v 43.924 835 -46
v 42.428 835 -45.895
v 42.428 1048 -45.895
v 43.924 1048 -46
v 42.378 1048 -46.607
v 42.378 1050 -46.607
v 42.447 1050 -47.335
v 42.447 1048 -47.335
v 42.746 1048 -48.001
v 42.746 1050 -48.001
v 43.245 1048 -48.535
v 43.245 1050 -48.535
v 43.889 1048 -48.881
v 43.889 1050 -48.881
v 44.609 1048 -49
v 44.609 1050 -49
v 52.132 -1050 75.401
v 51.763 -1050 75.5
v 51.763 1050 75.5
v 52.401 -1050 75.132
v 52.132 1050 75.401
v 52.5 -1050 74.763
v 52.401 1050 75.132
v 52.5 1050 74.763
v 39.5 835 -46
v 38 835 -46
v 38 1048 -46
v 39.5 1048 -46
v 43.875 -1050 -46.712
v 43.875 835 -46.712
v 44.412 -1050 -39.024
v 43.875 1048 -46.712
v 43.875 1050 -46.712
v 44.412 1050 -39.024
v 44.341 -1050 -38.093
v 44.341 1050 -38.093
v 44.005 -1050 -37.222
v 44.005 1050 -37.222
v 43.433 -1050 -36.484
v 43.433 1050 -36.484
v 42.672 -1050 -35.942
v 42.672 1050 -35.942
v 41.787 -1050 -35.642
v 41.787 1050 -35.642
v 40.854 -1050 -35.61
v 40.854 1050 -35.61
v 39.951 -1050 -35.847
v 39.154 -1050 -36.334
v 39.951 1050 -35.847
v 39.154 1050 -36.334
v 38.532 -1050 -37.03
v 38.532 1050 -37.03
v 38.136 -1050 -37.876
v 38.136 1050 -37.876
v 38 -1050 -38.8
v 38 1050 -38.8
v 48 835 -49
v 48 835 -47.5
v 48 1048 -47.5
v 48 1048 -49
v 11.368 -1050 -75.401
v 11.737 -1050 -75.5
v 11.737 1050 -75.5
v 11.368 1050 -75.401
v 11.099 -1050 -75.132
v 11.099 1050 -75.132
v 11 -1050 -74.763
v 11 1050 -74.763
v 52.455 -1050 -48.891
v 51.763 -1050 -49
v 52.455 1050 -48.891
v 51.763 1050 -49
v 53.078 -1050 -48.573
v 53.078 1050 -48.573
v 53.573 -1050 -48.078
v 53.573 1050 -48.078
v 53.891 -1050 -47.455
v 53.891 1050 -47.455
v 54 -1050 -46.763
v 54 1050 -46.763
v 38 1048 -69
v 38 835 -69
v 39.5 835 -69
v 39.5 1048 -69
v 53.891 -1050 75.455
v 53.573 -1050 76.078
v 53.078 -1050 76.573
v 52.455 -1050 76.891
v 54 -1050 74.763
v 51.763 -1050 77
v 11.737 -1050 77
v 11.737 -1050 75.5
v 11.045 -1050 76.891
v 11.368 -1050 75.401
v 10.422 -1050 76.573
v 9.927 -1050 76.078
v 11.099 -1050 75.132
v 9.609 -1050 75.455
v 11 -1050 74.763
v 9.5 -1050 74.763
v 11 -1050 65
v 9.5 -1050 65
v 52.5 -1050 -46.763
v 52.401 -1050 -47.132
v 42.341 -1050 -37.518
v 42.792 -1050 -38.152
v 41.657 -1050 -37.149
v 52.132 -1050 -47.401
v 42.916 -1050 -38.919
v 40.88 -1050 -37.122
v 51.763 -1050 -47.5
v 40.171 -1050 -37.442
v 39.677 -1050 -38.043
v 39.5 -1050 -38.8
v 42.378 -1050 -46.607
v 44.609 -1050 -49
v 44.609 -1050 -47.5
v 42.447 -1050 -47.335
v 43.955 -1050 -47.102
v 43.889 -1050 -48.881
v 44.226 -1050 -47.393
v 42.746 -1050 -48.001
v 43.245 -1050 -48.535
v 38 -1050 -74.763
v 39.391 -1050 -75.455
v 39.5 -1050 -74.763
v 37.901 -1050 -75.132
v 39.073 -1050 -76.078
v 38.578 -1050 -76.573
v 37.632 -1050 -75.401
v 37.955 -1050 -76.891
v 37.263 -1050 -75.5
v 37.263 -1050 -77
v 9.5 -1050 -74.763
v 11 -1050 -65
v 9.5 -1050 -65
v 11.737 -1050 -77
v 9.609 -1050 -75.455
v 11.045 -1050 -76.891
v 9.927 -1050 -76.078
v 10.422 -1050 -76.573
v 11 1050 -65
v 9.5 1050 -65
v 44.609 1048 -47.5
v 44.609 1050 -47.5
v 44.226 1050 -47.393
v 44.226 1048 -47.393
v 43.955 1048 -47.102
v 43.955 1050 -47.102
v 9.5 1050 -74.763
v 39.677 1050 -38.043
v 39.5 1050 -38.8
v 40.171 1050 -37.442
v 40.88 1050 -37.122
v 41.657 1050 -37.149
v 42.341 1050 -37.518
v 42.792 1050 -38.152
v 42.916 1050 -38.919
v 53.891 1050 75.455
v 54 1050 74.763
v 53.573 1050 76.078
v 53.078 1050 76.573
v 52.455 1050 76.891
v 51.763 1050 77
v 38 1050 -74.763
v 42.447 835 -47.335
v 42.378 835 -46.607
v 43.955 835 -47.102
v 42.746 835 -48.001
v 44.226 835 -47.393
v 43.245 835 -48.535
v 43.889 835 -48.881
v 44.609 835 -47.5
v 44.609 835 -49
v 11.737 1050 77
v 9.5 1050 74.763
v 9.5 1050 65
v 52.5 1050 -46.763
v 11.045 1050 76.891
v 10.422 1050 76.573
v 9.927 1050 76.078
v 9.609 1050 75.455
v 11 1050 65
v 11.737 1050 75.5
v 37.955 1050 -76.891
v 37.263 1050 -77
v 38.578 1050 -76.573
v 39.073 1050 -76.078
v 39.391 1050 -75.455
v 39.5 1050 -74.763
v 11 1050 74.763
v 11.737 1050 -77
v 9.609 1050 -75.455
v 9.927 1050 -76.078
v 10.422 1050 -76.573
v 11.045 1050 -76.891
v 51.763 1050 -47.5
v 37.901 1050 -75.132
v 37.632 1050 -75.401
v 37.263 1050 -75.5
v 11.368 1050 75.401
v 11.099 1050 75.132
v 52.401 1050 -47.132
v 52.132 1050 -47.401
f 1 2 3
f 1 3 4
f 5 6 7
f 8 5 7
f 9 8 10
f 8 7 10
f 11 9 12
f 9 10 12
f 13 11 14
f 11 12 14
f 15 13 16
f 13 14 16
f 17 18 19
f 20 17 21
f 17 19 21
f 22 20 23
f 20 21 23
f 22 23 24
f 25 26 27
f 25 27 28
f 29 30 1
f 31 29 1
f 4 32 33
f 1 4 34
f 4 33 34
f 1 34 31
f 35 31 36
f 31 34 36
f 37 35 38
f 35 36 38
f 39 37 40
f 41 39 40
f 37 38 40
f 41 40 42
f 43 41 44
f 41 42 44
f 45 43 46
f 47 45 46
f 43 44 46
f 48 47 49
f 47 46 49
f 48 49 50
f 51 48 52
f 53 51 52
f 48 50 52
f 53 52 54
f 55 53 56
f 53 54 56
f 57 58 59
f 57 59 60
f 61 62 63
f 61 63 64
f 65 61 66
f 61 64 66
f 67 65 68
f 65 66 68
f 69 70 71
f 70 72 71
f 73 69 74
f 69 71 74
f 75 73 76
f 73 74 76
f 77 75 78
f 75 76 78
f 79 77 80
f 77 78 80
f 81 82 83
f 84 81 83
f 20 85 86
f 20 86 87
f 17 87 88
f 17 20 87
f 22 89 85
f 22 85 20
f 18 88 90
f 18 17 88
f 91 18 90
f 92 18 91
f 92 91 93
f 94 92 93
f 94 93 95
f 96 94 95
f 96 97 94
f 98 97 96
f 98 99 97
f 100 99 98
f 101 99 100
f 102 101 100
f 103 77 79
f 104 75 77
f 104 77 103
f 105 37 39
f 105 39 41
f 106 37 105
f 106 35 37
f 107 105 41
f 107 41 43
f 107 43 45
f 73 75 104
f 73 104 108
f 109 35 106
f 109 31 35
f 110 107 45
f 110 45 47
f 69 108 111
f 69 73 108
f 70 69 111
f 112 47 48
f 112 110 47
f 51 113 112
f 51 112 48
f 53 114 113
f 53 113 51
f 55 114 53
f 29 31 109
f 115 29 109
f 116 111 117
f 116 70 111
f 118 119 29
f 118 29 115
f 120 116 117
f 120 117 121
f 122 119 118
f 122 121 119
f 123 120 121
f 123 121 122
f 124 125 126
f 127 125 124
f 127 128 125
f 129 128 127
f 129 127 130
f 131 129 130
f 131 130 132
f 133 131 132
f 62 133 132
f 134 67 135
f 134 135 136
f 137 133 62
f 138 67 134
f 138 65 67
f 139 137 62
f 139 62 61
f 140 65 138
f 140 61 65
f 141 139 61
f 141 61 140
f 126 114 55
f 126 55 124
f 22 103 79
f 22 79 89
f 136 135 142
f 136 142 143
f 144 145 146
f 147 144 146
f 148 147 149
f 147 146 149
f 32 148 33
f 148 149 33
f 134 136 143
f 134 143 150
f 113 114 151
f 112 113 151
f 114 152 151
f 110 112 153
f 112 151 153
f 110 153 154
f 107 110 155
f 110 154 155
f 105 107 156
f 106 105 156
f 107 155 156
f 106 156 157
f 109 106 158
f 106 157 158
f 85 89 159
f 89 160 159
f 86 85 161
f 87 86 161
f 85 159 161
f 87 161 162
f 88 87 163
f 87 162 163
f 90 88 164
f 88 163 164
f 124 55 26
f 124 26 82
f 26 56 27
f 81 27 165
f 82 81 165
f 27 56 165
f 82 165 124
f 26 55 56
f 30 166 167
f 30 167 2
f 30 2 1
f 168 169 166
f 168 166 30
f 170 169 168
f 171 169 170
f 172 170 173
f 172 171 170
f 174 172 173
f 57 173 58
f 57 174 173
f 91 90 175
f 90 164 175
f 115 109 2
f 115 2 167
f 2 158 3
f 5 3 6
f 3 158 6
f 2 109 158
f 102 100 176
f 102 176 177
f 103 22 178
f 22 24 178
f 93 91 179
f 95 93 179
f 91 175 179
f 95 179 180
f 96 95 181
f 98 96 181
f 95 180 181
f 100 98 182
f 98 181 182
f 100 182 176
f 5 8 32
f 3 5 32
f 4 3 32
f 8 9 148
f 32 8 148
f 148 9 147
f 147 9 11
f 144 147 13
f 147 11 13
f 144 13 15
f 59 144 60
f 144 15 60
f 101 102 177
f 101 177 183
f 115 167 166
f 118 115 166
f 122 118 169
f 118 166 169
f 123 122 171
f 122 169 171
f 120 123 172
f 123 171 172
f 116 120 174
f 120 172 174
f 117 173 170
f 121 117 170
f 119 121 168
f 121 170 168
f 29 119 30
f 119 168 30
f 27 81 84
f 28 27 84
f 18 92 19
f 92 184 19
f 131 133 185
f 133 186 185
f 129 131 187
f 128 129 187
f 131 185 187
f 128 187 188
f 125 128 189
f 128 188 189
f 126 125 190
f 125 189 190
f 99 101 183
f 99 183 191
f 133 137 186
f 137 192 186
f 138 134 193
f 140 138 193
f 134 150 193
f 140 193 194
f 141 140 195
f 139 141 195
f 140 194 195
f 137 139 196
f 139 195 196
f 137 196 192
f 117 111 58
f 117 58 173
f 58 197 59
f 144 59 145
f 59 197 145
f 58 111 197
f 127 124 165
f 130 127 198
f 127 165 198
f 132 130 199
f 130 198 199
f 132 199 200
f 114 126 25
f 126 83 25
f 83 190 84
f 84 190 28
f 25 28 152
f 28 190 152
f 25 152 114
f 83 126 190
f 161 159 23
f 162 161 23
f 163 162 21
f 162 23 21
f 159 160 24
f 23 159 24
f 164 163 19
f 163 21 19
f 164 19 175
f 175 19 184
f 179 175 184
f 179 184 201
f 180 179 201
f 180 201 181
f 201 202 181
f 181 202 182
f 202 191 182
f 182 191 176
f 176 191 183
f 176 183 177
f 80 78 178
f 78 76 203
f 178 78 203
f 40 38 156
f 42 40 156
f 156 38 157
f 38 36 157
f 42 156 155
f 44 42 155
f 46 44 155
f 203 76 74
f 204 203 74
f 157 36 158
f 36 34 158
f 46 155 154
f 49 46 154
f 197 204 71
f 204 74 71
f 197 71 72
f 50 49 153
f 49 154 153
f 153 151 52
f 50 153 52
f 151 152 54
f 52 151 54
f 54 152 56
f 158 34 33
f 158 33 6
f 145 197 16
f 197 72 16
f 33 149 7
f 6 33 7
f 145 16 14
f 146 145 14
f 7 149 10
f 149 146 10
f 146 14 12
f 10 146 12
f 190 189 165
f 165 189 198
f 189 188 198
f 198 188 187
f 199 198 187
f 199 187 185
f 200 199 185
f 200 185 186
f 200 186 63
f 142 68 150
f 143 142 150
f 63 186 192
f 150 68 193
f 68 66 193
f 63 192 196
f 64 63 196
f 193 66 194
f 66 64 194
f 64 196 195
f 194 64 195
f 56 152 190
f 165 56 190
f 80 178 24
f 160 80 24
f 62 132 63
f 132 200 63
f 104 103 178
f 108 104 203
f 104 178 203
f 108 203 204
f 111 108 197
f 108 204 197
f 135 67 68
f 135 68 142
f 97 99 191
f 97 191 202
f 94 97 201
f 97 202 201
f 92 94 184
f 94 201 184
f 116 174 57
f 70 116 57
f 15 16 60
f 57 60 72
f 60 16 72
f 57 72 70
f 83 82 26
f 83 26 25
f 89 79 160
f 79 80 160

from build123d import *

# Parameters (mm, degrees)
BASE_FLANGE1_DEPTH     = 1050
CUT_EXTRUDE3_START     = 835
CUT_EXTRUDE3_OUTLINE_W = 1.5
CUT_EXTRUDE3_OUTLINE_H = 23
CUT_EXTRUDE3_DEPTH     = 213


# Read off the part's stored shape, not the designer's step: Cut-Extrude3
# Sheet-metal steps are written as plain solids
with BuildPart() as part:
    # Sketch1 → Base-Flange1 (new, symmetric)
    with BuildSketch(Plane(origin=(0, 0, 0), x_dir=(1, 0, 0), z_dir=(0, 1, 0))):
        with BuildLine():
            Line((9.5, 65), (9.5, 74.7634))
            ThreePointArc((9.5, 74.7634), (10.155084973, 76.344915027), (11.7366, 77))
            Line((11.7366, 77), (37.2634, 77))
            ThreePointArc((37.2634, 77), (38.844915027, 76.344915027), (39.5, 74.7634))
            Line((39.5, 74.7634), (39.5, 49))
            Line((39.5, 49), (39.5, 38.8))
            ThreePointArc((39.5, 38.8), (41.269678139, 37.091041686), (42.915834526, 38.91928357))
            Line((42.915834526, 38.91928357), (42.378230266, 46.607382671))
            ThreePointArc((42.378230266, 46.607382671), (42.973636332, 48.288757532), (44.609382021, 49))
            Line((44.609382021, 49), (51.7634, 49))
            ThreePointArc((51.7634, 49), (53.344915027, 48.344915027), (54, 46.7634))
            Line((54, 46.7634), (54, -30))
            Line((54, -30), (54, -74.7634))
            ThreePointArc((54, -74.7634), (53.344915027, -76.344915027), (51.7634, -77))
            Line((51.7634, -77), (39.5, -77))
            Line((39.5, -77), (11.7366, -77))
            ThreePointArc((11.7366, -77), (10.155084973, -76.344915027), (9.5, -74.7634))
            Line((9.5, -74.7634), (9.5, -65))
            Line((9.5, -65), (11, -65))
            Line((11, -65), (11, -74.7634))
            ThreePointArc((11, -74.7634), (11.215745145, -75.284254855), (11.7366, -75.5))
            Line((11.7366, -75.5), (39.5, -75.5))
            Line((39.5, -75.5), (51.7634, -75.5))
            ThreePointArc((51.7634, -75.5), (52.284254855, -75.284254855), (52.5, -74.7634))
            Line((52.5, -74.7634), (52.5, -30))
            Line((52.5, -30), (52.5, 46.7634))
            ThreePointArc((52.5, 46.7634), (52.284254855, 47.284254855), (51.7634, 47.5))
            Line((51.7634, 47.5), (44.609382021, 47.5))
            ThreePointArc((44.609382021, 47.5), (44.070666884, 47.265759992), (43.874576341, 46.712017381))
            Line((43.874576341, 46.712017381), (44.412180601, 39.023918281))
            ThreePointArc((44.412180601, 39.023918281), (41.322027384, 35.591955445), (38, 38.8))
            Line((38, 38.8), (38, 49))
            Line((38, 49), (38, 74.7634))
            ThreePointArc((38, 74.7634), (37.784254855, 75.284254855), (37.2634, 75.5))
            Line((37.2634, 75.5), (11.7366, 75.5))
            ThreePointArc((11.7366, 75.5), (11.215745145, 75.284254855), (11, 74.7634))
            Line((11, 74.7634), (11, 65))
            Line((11, 65), (9.5, 65))
        make_face()
    extrude(amount=BASE_FLANGE1_DEPTH, both=True)

    # Cut-Extrude3 outline → Cut-Extrude3 (cut)
    with BuildSketch(Plane(origin=(0, 0, 0), x_dir=(1, 0, 0), z_dir=(0, 1, 0)).offset(CUT_EXTRUDE3_START)):
        with Locations((38.75, 57.5)):
            Rectangle(CUT_EXTRUDE3_OUTLINE_W, CUT_EXTRUDE3_OUTLINE_H)
        with BuildLine():
            Line((48, 47.5), (48, 49))
            Line((48, 49), (44.609382021, 49))
            ThreePointArc((44.609382021, 49), (42.973636332, 48.288757532), (42.378230266, 46.607382671))
            Line((42.378230266, 46.607382671), (42.428019372, 45.895365289))
            Line((42.428019372, 45.895365289), (43.924365447, 46))
            Line((43.924365447, 46), (43.874576341, 46.712017381))
            ThreePointArc((43.874576341, 46.712017381), (44.070666884, 47.265759992), (44.609382021, 47.5))
            Line((44.609382021, 47.5), (48, 47.5))
        make_face()
    extrude(amount=CUT_EXTRUDE3_DEPTH, mode=Mode.SUBTRACT)


solid = part.part
